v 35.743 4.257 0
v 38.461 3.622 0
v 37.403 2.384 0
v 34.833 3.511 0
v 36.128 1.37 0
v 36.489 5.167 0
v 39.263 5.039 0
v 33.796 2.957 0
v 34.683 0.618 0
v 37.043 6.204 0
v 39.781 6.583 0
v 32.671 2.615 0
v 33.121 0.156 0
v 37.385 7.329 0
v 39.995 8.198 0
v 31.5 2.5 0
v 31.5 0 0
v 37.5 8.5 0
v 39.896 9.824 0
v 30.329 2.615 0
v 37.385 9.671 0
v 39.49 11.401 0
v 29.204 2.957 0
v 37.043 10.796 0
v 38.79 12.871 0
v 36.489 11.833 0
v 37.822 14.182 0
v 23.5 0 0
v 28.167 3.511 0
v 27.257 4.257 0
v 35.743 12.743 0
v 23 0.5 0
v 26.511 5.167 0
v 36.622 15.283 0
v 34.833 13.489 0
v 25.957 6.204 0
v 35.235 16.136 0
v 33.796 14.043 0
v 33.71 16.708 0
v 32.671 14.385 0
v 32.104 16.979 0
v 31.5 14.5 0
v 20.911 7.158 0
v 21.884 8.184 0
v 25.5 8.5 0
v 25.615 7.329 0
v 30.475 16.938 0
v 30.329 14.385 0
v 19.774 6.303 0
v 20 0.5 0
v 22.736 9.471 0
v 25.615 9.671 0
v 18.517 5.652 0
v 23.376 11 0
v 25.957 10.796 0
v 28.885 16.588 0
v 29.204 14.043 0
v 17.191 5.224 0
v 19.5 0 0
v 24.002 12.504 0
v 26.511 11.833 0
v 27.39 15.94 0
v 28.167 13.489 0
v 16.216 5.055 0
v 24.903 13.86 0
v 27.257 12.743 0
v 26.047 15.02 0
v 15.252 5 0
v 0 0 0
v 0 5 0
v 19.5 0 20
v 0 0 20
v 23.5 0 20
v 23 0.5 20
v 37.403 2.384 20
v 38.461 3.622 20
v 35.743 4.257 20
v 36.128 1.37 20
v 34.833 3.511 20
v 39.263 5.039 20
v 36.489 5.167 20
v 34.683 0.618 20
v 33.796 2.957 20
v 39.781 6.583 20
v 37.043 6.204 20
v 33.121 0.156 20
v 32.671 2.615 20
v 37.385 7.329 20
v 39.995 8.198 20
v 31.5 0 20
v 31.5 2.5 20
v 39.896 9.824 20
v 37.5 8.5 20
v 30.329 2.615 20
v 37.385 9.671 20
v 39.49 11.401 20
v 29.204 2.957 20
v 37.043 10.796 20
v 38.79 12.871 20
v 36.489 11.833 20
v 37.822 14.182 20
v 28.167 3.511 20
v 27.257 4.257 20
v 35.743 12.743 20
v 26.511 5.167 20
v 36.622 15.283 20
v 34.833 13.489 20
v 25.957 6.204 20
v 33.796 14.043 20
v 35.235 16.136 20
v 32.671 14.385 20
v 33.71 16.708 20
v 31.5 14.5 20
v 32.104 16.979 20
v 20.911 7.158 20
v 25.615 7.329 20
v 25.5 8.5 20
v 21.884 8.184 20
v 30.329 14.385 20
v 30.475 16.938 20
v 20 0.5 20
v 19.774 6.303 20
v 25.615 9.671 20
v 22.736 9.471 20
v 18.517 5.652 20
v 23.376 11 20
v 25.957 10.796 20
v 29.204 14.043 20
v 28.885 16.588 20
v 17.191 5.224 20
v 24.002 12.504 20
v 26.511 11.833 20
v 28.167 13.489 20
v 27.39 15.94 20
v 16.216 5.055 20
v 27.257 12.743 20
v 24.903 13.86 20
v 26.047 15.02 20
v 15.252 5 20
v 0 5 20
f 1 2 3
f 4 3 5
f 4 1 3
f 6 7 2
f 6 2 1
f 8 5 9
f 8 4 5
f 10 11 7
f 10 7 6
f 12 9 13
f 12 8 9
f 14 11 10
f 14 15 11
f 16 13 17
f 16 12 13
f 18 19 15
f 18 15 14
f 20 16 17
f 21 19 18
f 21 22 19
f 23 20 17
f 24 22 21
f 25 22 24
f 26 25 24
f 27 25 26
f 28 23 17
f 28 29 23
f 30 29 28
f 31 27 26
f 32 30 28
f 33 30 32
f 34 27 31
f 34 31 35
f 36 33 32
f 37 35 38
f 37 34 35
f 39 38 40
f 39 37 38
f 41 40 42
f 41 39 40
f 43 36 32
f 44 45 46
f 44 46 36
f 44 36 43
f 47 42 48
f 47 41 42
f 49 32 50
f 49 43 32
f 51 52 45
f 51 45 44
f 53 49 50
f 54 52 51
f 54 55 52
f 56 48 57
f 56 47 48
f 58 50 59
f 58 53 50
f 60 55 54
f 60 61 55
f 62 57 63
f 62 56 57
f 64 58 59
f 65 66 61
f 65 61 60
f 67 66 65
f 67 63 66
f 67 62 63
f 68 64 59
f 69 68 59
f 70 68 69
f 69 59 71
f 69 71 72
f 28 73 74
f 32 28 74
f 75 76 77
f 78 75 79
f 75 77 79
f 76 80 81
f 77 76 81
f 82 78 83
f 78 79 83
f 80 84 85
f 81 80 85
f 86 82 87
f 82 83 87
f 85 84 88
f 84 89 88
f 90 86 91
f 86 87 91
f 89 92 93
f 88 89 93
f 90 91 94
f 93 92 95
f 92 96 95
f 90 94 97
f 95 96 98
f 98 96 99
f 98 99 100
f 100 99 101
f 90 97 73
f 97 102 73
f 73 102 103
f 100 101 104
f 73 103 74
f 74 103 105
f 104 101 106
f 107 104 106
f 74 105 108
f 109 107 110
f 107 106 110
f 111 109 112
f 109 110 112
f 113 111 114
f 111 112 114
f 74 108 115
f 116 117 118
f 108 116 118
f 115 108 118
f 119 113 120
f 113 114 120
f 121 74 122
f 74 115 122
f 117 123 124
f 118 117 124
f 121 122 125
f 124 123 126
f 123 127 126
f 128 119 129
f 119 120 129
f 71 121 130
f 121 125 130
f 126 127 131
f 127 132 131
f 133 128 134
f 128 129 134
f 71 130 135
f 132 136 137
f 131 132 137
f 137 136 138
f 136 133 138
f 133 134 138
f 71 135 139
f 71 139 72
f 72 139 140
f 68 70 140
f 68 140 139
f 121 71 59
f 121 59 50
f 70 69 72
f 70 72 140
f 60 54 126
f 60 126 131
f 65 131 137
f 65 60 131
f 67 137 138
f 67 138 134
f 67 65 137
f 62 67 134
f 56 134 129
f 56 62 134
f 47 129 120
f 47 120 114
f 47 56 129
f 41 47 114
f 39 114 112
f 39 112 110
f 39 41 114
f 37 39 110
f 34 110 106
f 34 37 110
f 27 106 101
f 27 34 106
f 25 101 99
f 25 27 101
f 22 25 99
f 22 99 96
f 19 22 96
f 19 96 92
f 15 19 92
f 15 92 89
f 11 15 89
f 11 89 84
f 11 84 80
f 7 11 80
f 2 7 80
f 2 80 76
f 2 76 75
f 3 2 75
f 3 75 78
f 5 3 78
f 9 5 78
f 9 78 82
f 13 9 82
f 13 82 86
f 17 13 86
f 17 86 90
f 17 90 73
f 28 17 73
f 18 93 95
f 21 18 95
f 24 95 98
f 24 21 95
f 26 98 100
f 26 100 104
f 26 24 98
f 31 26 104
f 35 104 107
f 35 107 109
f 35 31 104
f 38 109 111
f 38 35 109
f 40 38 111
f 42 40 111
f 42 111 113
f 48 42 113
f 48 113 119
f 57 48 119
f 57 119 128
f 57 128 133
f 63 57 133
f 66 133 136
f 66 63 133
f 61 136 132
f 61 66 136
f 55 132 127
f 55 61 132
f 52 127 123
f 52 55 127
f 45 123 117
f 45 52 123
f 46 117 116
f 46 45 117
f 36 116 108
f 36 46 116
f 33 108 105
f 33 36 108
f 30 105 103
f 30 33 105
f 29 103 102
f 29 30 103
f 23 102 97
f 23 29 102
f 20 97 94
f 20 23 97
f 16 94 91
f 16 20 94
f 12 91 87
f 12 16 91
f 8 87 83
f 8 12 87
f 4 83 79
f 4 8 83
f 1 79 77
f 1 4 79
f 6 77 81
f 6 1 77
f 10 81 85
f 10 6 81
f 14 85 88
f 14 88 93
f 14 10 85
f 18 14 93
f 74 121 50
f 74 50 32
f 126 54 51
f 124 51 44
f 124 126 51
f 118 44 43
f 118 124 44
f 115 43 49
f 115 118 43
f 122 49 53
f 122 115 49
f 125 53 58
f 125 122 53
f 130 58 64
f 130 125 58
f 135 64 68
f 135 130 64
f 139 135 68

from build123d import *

# Parameters (mm, degrees)
SKETCH_2_R          = 6
EXTRUDE_1_DEPTH     = 20
FILLET_1_R          = 8.5
SKETCH_3_W          = 3
SKETCH_3_H          = 0.5
CUT_EXTRUDE_1_DEPTH = 100
CUT_EXTRUDE_2_DEPTH = 100


with BuildPart() as part:
    # 草图2 → 凸台-拉伸1 (new body)
    with BuildSketch(Plane.XY):
        with BuildLine():
            ThreePointArc((23, 8.5), (37.51040764, 14.51040764), (31.5, 0))
            Line((31.5, 0), (23, 0))
            Line((23, 0), (20, 0))
            Line((20, 0), (0, 0))
            Line((0, 0), (0, 5))
            Line((0, 5), (23, 5))
            Line((23, 5), (23, 8.5))
        make_face()
        with Locations((31.5, 8.5)):
            Circle(SKETCH_2_R, mode=Mode.SUBTRACT)
    extrude(amount=EXTRUDE_1_DEPTH)

    # 圆角1
    fillet_1_edges = [part.edges().sort_by_distance(p)[0] for p in [
        (23, 5, 10),
    ]]
    fillet(fillet_1_edges, radius=FILLET_1_R)

    # 草图3 → 切除-拉伸1 (cut)
    with BuildSketch(Plane.XY.offset(20)):
        with Locations((21.5, 0.25)):
            Rectangle(SKETCH_3_W, SKETCH_3_H)
    extrude(amount=-CUT_EXTRUDE_1_DEPTH, mode=Mode.SUBTRACT)

    # 草图4 → 切除-拉伸2 (cut)
    with BuildSketch(Plane.XY.offset(20)):
        Polygon((23, 0), (23.5, 0), (23, 0.5), align=None)
        Polygon((20, 0), (19.5, 0), (20, 0.5), align=None)
    extrude(amount=-CUT_EXTRUDE_2_DEPTH, mode=Mode.SUBTRACT)


solid = part.part
